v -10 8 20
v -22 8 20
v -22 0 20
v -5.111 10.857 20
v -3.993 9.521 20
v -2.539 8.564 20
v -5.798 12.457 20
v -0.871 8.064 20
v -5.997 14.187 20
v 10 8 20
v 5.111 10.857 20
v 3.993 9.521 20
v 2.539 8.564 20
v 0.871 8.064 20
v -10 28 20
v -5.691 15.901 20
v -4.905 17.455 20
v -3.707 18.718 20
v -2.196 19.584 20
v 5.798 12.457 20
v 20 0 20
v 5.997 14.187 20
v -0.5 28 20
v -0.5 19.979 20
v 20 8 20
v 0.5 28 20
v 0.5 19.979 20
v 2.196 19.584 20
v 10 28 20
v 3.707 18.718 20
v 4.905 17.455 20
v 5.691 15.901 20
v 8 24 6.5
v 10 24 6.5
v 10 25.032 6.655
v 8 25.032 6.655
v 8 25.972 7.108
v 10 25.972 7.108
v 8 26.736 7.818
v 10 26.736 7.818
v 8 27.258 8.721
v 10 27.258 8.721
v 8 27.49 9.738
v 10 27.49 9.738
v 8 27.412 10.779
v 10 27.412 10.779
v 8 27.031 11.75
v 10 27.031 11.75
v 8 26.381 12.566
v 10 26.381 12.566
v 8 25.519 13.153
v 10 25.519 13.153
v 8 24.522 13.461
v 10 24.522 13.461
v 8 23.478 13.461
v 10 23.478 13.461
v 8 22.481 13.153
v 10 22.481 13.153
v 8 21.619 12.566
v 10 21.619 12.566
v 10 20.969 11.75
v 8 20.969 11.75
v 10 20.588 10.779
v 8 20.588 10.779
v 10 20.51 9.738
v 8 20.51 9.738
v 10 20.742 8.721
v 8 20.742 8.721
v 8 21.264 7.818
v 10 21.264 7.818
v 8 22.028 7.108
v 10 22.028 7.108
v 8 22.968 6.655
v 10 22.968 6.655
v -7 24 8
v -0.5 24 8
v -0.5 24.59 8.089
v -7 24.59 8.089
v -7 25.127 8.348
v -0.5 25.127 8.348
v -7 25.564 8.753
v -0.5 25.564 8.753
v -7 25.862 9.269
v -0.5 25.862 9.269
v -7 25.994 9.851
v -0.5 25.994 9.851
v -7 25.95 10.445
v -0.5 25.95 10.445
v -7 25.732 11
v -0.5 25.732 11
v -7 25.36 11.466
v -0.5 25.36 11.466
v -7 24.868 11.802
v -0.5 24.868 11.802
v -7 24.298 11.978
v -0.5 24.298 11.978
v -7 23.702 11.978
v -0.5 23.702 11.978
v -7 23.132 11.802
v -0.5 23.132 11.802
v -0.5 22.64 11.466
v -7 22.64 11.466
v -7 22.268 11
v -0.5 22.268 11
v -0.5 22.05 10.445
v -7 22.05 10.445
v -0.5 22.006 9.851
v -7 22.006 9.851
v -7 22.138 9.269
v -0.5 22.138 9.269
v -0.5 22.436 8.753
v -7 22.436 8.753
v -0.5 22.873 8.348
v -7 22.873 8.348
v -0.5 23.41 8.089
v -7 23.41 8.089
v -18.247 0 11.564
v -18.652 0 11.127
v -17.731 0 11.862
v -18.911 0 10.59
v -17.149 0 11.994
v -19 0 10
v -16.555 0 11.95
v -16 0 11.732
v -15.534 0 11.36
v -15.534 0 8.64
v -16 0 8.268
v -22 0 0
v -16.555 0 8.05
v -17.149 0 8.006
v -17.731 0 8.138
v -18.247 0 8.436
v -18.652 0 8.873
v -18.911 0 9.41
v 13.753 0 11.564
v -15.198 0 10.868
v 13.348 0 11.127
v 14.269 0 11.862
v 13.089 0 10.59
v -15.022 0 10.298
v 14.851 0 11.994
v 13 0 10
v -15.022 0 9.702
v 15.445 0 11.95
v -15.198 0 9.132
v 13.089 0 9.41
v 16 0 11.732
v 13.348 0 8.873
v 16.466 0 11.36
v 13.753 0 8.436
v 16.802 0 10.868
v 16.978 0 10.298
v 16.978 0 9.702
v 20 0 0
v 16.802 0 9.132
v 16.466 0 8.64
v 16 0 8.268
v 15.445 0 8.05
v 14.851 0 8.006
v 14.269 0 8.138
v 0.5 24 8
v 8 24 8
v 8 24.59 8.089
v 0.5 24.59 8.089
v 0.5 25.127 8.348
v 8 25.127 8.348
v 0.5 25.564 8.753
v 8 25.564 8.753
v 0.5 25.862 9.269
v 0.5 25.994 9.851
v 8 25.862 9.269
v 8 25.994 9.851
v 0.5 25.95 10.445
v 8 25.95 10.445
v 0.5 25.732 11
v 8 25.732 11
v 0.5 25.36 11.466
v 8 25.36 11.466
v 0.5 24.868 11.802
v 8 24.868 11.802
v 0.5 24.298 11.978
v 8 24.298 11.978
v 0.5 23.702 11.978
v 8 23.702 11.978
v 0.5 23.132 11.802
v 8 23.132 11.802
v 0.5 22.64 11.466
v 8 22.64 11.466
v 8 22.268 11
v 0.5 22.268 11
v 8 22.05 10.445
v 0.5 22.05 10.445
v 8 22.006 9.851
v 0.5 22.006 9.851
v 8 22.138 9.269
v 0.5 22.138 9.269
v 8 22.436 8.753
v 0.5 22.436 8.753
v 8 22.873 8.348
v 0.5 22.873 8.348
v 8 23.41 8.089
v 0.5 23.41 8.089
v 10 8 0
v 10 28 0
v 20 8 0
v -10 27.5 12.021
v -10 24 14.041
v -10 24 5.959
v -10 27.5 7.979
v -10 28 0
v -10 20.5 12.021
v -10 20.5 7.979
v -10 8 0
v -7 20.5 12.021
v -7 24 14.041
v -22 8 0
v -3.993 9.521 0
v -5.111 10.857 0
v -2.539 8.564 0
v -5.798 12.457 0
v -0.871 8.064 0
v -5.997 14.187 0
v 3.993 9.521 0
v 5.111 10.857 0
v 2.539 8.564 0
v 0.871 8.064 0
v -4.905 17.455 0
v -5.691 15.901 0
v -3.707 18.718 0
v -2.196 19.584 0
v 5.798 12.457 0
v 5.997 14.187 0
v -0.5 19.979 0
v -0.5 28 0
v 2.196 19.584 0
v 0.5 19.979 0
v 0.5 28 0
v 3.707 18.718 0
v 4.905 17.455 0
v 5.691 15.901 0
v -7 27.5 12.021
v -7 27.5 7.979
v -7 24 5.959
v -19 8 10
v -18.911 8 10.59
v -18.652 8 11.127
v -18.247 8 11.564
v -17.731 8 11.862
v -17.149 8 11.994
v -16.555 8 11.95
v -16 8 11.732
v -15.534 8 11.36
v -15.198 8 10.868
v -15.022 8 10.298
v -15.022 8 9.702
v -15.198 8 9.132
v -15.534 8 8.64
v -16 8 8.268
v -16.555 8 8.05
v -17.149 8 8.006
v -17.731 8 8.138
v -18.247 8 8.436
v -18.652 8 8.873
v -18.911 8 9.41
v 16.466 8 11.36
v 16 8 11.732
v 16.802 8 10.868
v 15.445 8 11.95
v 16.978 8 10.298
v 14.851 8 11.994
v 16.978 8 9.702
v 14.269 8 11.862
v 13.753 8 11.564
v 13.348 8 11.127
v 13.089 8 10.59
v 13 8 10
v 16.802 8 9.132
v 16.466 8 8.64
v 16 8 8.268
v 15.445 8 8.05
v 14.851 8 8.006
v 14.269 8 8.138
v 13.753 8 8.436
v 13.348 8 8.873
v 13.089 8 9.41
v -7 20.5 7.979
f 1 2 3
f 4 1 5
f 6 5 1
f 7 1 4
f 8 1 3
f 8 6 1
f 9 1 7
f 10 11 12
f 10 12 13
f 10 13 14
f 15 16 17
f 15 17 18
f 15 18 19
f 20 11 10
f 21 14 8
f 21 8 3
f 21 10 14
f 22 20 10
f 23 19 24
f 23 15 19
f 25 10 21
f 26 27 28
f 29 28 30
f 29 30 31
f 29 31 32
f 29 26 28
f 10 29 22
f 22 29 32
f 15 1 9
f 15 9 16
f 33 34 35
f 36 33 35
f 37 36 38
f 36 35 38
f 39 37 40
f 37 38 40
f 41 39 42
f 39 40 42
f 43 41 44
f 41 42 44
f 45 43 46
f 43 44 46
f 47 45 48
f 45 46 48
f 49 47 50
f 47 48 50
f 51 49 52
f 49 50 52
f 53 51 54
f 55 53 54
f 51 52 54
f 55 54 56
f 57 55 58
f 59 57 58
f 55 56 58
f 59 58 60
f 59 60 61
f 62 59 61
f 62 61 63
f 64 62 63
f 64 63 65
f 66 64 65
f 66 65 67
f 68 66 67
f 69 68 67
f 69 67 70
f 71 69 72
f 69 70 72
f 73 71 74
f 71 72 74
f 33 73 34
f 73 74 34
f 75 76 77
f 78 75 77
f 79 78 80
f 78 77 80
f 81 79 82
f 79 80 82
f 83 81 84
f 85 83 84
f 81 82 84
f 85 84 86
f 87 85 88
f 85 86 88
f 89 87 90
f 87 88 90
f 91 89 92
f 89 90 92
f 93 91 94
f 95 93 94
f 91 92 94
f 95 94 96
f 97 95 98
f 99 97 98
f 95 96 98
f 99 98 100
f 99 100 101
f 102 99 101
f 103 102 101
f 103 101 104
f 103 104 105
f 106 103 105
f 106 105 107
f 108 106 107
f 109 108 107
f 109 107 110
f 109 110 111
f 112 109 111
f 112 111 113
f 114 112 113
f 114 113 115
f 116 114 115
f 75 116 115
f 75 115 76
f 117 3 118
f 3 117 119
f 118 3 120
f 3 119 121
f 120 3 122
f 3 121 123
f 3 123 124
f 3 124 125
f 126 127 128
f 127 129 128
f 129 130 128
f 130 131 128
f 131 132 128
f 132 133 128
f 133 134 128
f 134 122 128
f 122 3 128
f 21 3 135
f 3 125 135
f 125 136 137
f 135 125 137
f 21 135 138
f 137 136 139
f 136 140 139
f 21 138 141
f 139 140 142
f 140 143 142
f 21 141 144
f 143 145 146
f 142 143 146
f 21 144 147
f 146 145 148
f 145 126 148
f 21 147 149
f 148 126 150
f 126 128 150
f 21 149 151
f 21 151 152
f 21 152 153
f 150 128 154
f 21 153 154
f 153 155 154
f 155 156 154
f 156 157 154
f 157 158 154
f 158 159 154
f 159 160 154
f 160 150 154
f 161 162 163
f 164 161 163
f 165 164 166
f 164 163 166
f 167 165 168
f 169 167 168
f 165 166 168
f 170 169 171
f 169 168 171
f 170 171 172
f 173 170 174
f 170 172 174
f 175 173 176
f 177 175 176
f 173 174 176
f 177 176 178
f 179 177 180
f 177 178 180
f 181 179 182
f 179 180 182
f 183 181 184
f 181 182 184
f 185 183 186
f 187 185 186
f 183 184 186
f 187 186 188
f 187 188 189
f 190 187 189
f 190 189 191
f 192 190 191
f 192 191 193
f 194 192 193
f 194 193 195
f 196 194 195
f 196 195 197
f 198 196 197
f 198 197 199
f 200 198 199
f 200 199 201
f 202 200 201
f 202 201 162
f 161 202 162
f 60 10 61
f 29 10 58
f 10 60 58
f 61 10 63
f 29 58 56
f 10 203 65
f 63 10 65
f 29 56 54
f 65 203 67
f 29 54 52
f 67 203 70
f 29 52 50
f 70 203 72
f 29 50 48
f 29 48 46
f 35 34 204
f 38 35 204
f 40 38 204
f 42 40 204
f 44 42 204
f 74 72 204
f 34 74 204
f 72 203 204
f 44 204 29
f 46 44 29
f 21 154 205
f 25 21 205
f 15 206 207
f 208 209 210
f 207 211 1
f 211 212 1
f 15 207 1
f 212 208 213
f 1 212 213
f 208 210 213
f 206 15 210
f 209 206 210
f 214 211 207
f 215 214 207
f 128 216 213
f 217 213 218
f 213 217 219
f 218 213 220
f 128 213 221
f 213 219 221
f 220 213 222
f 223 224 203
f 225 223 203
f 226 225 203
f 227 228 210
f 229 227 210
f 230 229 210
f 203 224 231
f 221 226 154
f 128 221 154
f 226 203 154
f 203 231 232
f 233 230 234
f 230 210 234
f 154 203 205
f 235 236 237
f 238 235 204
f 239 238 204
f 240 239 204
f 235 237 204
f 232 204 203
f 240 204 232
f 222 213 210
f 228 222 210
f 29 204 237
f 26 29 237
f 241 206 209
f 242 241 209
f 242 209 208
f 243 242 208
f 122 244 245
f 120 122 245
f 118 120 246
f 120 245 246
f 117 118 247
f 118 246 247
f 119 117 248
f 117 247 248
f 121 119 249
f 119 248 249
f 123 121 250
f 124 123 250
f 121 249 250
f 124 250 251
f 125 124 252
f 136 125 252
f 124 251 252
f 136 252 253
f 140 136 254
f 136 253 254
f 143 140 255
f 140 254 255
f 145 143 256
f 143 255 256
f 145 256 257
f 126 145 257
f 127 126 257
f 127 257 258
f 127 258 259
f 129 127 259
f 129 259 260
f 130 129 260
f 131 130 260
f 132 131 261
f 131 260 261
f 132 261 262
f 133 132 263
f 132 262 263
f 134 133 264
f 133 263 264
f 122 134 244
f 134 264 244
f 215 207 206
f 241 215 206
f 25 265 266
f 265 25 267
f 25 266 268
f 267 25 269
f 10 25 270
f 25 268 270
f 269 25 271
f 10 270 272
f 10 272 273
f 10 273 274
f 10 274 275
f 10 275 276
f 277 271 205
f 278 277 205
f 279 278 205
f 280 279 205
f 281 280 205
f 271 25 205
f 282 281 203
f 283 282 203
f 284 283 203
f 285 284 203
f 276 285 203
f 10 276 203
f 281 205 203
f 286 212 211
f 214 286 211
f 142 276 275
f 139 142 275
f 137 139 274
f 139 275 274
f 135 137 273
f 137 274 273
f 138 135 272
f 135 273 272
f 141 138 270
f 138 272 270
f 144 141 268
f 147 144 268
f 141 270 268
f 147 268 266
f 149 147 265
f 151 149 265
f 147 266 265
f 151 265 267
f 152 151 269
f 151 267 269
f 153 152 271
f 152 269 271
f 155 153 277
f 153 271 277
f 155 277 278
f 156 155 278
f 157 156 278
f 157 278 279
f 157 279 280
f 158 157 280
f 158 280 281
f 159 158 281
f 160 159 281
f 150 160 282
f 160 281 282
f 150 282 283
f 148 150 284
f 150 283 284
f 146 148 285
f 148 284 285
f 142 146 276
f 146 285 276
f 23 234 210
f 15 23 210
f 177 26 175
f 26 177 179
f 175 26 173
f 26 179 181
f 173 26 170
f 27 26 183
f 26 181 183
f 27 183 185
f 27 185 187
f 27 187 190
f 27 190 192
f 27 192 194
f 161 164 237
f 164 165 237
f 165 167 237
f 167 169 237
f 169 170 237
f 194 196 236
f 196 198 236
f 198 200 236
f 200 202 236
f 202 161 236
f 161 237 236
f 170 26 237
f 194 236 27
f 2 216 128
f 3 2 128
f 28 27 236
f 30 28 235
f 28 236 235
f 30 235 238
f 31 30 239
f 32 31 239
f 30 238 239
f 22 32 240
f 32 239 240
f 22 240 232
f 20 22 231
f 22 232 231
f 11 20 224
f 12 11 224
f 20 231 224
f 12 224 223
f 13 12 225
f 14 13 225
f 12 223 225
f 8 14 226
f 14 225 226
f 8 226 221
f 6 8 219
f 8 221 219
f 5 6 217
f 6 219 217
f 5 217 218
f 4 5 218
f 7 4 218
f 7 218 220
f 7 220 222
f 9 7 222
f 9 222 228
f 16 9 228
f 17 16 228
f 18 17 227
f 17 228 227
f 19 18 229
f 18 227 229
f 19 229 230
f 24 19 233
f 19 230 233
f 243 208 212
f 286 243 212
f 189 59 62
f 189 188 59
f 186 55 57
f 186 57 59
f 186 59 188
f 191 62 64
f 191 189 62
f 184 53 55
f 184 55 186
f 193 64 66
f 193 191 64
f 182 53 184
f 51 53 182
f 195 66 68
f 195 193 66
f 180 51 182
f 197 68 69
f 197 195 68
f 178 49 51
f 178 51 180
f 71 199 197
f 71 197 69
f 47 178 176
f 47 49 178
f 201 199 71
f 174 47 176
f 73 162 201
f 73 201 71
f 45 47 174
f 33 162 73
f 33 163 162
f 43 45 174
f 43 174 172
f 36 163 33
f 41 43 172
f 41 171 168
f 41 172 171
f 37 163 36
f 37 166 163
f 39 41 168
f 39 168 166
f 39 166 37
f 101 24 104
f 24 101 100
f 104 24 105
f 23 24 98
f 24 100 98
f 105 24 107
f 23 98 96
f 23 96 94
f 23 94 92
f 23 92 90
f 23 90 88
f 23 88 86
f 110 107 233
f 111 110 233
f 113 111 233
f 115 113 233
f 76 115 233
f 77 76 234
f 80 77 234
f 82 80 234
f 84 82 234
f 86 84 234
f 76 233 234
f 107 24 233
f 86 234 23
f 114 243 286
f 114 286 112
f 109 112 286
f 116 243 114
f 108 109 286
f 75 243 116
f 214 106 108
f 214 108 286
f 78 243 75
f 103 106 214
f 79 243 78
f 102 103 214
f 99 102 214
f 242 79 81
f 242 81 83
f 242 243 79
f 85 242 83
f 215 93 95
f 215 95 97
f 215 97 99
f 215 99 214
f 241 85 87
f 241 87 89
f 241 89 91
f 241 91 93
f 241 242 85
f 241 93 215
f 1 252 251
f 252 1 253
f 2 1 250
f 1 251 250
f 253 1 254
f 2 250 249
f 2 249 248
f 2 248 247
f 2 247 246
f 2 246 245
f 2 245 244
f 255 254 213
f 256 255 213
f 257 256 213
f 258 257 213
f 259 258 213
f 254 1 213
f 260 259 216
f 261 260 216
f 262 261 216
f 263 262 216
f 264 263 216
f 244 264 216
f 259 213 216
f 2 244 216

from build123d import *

# Parameters (mm, degrees)
EXTRUDE_1_DEPTH     = 20
SKETCH_4_R          = 2
CUT_EXTRUDE_1_DEPTH = 8
CUT_EXTRUDE_2_REACH = 48.989
SKETCH_5_R          = 2
SKETCH_6_R          = 3.5
CUT_EXTRUDE_3_DEPTH = 2
CUT_EXTRUDE_4_DEPTH = 3


with BuildPart() as part:
    # Эскиз1 → Бобышка-Вытянуть1 (new body)
    with BuildSketch(Plane.XY):
        with BuildLine():
            Line((-22, 0), (20, 0))
            Line((20, 0), (20, 8))
            Line((20, 8), (10, 8))
            Line((10, 8), (10, 28))
            Line((10, 28), (0.5, 28))
            Line((0.5, 28), (0.5, 19.979130372))
            ThreePointArc((0.5, 19.979130372), (0, 8), (-0.5, 19.979130372))
            Line((-0.5, 19.979130372), (-0.5, 28))
            Line((-0.5, 28), (-10, 28))
            Line((-10, 28), (-10, 8))
            Line((-10, 8), (-22, 8))
            Line((-22, 8), (-22, 0))
        make_face()
    extrude(amount=EXTRUDE_1_DEPTH)

    # Эскиз4 → Вырез-Вытянуть1 (cut)
    with BuildSketch(Plane(origin=(0, 8, 0), x_dir=(1, 0, 0), z_dir=(0, 1, 0))):
        with Locations(Location((15, -10, 0), (0, 0, 180))):
            Circle(SKETCH_4_R)
        with Locations(Location((-17, -10, 0), (0, 0, 180))):
            Circle(SKETCH_4_R)
    extrude(amount=-CUT_EXTRUDE_1_DEPTH, mode=Mode.SUBTRACT)

    # Вырез-Вытянуть2: up to this face of the body (flat: up to its plane)
    cut_extrude_2_end = Plane(part.part.faces().sort_by_distance((-10, 18, 10))[0])
    # Эскиз5 → Вырез-Вытянуть2 (cut, up to the picked face)
    with BuildSketch(Plane(origin=(10, 0, 0), x_dir=(0, 0, -1), z_dir=(1, 0, 0)), mode=Mode.PRIVATE) as cut_extrude_2_sk1:
        with Locations((-10, 24)):
            Circle(SKETCH_5_R)
    cut_extrude_2_tool1 = split(extrude(cut_extrude_2_sk1.sketch, amount=-CUT_EXTRUDE_2_REACH, mode=Mode.PRIVATE), bisect_by=cut_extrude_2_end, keep=Keep.BOTH, mode=Mode.PRIVATE)
    add(cut_extrude_2_tool1.solids().sort_by(Axis((10, 24, 10), (-1, 0, 0)))[0], mode=Mode.SUBTRACT)

    # Эскиз6 → Вырез-Вытянуть3 (cut)
    with BuildSketch(Plane(origin=(10, 0, 0), x_dir=(0, 0, -1), z_dir=(1, 0, 0))):
        with Locations((-10, 24)):
            Circle(SKETCH_6_R)
    extrude(amount=-CUT_EXTRUDE_3_DEPTH, mode=Mode.SUBTRACT)

    # Эскиз7 → Вырез-Вытянуть4 (cut)
    with BuildSketch(Plane.ZY.offset(10)):
        Polygon((14.041451884, 24), (12.020725942, 27.5), (7.979274058, 27.5), (5.958548116, 24), (7.979274058, 20.5), (12.020725942, 20.5), align=None)
    extrude(amount=-CUT_EXTRUDE_4_DEPTH, mode=Mode.SUBTRACT)


solid = part.part
